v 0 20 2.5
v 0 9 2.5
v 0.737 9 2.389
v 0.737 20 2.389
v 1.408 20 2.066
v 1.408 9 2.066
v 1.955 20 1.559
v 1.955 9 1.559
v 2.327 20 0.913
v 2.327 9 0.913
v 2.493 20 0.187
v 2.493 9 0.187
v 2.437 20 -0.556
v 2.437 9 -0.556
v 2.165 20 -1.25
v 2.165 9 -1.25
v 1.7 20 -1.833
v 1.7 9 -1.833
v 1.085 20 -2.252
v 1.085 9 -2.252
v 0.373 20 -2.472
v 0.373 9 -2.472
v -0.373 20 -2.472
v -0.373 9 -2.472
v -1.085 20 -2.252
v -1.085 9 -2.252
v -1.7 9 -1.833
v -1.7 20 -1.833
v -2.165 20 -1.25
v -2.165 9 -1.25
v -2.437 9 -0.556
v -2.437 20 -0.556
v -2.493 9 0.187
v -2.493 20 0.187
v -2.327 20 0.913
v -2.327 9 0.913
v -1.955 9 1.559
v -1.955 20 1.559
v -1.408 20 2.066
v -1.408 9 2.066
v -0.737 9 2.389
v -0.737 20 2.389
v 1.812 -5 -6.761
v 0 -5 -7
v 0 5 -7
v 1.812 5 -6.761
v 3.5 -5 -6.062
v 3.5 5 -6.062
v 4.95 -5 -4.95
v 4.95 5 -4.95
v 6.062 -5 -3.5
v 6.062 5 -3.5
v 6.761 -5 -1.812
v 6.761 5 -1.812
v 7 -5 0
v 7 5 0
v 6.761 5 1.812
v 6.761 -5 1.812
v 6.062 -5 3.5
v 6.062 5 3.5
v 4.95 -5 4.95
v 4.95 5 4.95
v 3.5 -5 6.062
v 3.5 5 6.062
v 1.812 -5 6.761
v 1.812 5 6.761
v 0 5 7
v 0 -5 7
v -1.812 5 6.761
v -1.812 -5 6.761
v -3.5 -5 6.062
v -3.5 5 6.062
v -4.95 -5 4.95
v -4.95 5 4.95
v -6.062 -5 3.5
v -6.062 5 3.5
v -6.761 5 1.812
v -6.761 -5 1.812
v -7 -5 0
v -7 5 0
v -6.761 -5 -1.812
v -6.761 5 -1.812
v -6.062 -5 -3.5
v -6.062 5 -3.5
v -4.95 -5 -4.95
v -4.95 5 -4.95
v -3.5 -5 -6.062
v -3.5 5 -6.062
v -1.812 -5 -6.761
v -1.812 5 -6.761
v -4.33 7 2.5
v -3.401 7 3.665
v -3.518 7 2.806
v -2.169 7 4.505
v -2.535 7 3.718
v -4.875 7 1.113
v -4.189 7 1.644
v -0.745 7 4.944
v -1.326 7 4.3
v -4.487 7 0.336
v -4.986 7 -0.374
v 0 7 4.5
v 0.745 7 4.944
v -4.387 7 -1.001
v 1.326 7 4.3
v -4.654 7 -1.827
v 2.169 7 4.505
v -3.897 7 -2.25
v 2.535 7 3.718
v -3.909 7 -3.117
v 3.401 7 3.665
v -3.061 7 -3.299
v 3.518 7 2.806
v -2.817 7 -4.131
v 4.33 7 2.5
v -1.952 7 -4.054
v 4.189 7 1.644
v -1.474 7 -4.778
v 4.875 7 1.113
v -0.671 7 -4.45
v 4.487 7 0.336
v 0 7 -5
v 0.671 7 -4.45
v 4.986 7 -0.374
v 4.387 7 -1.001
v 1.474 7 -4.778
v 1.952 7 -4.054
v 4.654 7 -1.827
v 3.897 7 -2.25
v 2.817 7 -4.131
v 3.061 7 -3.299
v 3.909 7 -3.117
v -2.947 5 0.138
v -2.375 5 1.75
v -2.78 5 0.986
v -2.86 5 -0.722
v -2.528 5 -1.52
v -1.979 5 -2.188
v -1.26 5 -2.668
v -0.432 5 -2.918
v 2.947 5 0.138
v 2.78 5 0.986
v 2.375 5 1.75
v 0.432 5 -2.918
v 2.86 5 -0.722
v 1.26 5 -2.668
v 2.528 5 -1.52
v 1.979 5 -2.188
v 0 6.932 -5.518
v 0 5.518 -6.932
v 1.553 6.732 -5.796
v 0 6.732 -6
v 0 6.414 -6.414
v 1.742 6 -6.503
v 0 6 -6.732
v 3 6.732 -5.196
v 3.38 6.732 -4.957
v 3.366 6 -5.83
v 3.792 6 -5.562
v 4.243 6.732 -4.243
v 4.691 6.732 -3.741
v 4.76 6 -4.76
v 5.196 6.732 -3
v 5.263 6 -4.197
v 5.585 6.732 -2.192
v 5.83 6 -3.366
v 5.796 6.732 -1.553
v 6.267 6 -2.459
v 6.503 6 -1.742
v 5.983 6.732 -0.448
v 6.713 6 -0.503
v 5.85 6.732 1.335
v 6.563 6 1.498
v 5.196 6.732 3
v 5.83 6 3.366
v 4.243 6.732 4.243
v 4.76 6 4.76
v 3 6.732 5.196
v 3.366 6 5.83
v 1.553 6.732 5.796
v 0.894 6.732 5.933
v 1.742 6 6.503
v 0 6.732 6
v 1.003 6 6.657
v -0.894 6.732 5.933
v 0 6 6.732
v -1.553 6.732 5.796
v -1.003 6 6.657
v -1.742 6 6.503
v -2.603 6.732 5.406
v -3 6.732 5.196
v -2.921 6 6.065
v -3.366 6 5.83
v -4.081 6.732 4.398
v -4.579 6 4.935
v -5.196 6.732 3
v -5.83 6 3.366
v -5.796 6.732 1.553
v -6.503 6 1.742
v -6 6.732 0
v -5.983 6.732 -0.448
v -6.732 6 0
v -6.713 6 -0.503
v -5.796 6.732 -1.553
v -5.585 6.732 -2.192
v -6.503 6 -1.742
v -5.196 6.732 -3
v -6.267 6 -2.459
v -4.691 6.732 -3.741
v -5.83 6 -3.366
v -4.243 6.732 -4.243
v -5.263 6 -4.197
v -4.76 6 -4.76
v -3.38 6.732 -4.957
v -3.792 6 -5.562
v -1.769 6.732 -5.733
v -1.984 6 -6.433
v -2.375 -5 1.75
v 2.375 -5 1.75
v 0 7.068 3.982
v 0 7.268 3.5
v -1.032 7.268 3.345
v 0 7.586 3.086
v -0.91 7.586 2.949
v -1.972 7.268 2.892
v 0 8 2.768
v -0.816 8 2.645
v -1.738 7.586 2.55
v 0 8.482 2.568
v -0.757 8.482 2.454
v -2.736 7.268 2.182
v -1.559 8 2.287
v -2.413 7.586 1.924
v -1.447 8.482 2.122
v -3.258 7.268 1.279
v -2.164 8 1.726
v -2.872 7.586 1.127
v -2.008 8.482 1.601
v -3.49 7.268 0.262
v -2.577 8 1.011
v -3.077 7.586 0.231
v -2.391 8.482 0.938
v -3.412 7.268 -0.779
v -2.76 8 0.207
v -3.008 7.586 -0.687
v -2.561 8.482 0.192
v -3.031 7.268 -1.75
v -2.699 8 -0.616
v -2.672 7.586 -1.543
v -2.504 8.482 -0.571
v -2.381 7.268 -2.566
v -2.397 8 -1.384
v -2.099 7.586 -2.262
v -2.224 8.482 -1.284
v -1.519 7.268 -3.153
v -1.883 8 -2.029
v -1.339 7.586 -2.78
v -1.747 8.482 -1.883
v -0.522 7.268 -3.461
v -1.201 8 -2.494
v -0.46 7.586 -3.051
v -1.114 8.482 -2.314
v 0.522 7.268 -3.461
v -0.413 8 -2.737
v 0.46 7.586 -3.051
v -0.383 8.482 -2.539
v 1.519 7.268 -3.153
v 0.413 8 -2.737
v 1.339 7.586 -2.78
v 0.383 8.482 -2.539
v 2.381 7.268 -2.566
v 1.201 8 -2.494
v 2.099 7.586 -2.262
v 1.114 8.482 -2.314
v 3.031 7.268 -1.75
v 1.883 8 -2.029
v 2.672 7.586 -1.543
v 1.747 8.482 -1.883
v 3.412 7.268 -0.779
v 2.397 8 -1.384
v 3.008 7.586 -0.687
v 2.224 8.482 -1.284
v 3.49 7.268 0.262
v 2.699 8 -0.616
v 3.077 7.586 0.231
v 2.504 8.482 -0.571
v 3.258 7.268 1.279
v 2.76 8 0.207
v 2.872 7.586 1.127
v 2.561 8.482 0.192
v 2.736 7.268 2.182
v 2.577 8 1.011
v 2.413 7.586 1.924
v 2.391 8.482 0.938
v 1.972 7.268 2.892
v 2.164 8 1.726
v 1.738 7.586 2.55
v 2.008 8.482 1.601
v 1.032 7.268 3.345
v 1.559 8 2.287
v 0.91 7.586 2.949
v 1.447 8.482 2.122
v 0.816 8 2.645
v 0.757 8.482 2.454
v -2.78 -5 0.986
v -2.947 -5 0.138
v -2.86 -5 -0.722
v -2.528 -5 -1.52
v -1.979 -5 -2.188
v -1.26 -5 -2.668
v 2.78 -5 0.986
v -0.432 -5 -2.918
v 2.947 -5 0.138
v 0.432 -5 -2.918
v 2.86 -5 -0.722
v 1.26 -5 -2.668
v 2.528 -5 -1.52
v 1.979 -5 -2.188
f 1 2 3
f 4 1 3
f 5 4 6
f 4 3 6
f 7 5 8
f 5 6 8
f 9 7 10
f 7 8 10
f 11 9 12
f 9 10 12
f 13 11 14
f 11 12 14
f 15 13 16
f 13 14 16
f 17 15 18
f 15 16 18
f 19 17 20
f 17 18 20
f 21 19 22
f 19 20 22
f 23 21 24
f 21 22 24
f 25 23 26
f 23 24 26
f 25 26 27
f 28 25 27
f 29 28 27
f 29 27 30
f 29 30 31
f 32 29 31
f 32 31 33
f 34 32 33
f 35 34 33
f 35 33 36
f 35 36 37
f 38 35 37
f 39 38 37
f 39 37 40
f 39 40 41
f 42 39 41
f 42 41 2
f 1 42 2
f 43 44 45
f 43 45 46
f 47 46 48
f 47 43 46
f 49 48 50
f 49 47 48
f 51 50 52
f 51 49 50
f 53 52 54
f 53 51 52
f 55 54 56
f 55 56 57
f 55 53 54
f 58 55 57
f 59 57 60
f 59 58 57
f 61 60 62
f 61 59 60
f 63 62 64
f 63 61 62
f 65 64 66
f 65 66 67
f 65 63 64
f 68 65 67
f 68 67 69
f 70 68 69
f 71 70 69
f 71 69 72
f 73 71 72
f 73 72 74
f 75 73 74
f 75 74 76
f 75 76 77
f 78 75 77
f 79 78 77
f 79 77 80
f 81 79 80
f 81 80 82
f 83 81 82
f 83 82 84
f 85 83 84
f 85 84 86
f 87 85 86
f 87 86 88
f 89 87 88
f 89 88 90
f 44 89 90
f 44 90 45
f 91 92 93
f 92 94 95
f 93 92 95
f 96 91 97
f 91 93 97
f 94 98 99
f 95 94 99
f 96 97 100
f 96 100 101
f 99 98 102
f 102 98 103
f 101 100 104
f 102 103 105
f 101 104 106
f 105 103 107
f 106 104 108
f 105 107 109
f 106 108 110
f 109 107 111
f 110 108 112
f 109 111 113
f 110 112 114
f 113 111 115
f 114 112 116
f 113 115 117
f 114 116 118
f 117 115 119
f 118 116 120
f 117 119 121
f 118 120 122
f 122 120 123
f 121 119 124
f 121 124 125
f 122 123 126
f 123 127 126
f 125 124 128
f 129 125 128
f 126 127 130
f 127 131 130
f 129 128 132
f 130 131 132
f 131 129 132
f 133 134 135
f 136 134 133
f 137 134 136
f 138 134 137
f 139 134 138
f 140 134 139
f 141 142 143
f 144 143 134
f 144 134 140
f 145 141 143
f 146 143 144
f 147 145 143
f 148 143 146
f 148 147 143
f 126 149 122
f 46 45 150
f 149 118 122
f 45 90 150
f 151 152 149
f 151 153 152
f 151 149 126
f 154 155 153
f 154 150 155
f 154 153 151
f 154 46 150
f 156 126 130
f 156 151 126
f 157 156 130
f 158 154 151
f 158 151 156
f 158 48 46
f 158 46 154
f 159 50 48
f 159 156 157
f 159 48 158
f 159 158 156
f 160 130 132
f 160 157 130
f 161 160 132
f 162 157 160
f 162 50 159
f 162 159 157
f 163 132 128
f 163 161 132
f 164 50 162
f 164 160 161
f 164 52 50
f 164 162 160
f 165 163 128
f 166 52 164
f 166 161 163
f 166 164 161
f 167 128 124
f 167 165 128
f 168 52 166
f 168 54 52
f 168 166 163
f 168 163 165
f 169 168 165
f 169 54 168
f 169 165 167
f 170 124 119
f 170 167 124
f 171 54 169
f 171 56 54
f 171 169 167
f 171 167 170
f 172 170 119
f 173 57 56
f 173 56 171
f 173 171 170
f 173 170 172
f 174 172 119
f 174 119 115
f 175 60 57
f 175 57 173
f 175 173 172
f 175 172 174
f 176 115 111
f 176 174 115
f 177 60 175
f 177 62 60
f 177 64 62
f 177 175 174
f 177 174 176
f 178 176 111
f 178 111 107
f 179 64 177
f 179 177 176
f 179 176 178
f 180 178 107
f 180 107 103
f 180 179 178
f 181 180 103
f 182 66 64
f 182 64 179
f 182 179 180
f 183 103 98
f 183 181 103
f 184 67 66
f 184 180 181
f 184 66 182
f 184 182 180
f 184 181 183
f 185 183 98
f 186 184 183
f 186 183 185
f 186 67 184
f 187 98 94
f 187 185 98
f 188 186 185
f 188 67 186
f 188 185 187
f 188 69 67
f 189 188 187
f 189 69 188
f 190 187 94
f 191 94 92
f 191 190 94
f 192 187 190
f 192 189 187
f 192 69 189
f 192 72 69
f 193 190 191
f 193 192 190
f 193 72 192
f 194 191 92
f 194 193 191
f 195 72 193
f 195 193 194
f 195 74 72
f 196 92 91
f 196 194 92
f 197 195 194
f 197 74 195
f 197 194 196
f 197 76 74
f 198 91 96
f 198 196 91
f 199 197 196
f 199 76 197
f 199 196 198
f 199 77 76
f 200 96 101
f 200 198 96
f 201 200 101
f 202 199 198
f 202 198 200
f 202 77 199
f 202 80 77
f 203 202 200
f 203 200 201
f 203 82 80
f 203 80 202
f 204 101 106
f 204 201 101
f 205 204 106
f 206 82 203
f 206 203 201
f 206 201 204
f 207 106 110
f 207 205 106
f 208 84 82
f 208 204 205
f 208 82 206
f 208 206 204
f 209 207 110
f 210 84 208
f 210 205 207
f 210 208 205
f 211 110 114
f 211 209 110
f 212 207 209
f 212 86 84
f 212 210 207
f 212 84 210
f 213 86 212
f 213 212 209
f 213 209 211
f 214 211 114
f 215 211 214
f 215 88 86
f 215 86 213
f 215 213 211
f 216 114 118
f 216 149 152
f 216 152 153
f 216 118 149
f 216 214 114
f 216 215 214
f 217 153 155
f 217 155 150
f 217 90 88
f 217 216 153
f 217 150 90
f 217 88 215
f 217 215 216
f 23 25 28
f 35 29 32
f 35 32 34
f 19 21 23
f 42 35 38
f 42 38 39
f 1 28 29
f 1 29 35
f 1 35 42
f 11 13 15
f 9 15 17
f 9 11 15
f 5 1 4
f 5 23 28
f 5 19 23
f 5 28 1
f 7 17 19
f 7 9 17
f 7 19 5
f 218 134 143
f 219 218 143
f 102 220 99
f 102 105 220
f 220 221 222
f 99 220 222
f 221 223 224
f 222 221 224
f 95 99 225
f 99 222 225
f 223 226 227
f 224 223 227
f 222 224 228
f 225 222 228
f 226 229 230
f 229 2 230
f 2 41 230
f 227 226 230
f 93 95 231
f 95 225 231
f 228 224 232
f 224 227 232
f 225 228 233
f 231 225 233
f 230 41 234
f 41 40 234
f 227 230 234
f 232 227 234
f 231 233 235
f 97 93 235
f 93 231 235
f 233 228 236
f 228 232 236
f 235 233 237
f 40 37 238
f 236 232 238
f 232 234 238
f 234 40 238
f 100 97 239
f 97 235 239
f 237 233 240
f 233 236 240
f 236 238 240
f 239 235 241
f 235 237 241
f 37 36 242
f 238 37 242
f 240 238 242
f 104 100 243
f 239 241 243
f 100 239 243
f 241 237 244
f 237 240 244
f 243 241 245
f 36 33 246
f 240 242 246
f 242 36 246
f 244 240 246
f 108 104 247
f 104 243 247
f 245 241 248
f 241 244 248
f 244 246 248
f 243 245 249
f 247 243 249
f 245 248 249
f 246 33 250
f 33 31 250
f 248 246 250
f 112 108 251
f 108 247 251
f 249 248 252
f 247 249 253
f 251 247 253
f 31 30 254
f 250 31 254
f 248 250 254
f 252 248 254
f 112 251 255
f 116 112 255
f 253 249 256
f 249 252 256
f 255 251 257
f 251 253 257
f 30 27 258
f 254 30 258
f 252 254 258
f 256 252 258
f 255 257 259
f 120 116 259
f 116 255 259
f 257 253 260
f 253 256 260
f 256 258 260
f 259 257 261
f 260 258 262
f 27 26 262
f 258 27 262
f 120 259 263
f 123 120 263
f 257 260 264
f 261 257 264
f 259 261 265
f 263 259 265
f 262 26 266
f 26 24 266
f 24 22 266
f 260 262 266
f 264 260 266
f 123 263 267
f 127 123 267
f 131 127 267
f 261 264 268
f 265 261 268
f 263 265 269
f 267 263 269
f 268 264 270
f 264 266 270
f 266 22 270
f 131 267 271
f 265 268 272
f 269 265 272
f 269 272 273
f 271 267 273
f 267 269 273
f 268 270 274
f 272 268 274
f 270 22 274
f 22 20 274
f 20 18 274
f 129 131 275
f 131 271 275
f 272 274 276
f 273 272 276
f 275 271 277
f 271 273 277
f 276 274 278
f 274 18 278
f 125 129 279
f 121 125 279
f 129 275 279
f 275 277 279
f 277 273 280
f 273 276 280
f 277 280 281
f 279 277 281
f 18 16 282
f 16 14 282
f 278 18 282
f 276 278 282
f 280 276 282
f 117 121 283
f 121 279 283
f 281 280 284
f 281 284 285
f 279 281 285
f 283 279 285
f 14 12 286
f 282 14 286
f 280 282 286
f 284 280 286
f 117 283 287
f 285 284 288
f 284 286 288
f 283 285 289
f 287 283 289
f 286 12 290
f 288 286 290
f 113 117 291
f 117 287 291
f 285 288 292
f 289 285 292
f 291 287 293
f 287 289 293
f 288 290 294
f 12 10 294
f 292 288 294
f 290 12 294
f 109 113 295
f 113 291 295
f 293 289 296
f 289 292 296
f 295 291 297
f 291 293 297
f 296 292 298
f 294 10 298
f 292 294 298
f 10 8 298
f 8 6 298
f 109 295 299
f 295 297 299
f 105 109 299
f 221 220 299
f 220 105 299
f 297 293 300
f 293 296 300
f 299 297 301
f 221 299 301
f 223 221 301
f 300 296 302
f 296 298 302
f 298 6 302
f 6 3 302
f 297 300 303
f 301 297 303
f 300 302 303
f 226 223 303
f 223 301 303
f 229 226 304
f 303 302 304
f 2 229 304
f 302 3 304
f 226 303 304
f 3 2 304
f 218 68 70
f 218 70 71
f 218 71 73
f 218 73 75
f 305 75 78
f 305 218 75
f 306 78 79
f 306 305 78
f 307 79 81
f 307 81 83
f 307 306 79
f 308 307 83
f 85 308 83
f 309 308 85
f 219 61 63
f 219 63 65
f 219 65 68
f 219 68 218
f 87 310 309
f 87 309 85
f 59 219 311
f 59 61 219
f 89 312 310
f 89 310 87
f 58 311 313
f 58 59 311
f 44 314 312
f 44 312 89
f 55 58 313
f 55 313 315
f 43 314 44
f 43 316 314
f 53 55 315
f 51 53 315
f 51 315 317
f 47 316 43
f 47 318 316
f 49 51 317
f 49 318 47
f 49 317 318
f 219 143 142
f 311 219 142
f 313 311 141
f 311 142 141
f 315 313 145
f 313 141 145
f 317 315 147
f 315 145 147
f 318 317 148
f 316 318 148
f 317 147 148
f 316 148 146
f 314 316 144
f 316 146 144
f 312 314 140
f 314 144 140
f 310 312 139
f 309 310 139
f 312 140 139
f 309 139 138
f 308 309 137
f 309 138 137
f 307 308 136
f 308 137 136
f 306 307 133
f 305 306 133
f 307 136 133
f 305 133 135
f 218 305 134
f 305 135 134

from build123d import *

# Parameters (mm, degrees)
SKETCH1_R           = 12.5
SKETCH1_R_2         = 2
BOSS_EXTRUDE1_DEPTH = 5
SKETCH2_R           = 2.5
BOSS_EXTRUDE2_DEPTH = 15
SKETCH3_R           = 5
CUT_EXTRUDE1_DEPTH  = 2
SKETCH4_R           = 12.5
CUT_EXTRUDE2_DEPTH  = 24.184046239
SKETCH5_R           = 7
BOSS_EXTRUDE3_DEPTH = 10
BOSS_EXTRUDE4_START = -2
SKETCH5_3_R         = 7
BOSS_EXTRUDE4_DEPTH = 2
FILLET1_R           = 2
FILLET2_R           = 2


with BuildPart() as part:
    # Sketch1 → Boss-Extrude1 (new body)
    with BuildSketch(Plane(origin=(0, 0, 0), x_dir=(1, 0, 0), z_dir=(0, 1, 0))):
        Circle(SKETCH1_R)
        with Locations((-7.5, 0)):
            Circle(SKETCH1_R_2, mode=Mode.SUBTRACT)
        with BuildLine():
            ThreePointArc((2, -7.5), (-1.414213562, -8.914213562), (0, -5.5))
            ThreePointArc((0, -5.5), (1.414213562, -6.085786438), (2, -7.5))
        make_face(mode=Mode.SUBTRACT)
        with BuildLine():
            ThreePointArc((9.5, 0), (7.5, -2), (5.5, 0))
            ThreePointArc((5.5, 0), (7.5, 2), (9.5, 0))
        make_face(mode=Mode.SUBTRACT)
        with BuildLine():
            ThreePointArc((2, 7.5), (1.414213562, 6.085786438), (0, 5.5))
            ThreePointArc((0, 5.5), (-1.414213562, 8.914213562), (2, 7.5))
        make_face(mode=Mode.SUBTRACT)
    extrude(amount=BOSS_EXTRUDE1_DEPTH)

    # Sketch2 → Boss-Extrude2 (add)
    with BuildSketch(Plane(origin=(0, 5, 0), x_dir=(1, 0, 0), z_dir=(0, 1, 0))):
        Circle(SKETCH2_R)
    extrude(amount=BOSS_EXTRUDE2_DEPTH)

    # Sketch3 → Cut-Extrude1 (cut)
    with BuildSketch(Plane.XZ):
        Circle(SKETCH3_R)
    extrude(amount=-CUT_EXTRUDE1_DEPTH, mode=Mode.SUBTRACT)

    # Sketch4 → Cut-Extrude2 (cut, through all)
    with BuildSketch(Plane(origin=(0, 5, 0), x_dir=(1, 0, 0), z_dir=(0, 1, 0))):
        Circle(SKETCH4_R)
    extrude(amount=-CUT_EXTRUDE2_DEPTH, mode=Mode.SUBTRACT)

    # Sketch5 → Boss-Extrude3 (add)
    with BuildSketch(Plane.XZ.offset(-5)):
        Circle(SKETCH5_R)
        with BuildLine():
            ThreePointArc((2.374868417, 1.75), (0, -2.95), (-2.374868417, 1.75))
            Line((-2.374868417, 1.75), (2.374868417, 1.75))
        make_face(mode=Mode.SUBTRACT)
    extrude(amount=BOSS_EXTRUDE3_DEPTH)

    # Sketch5<3> → Boss-Extrude4 (add)
    with BuildSketch(Plane.XZ.offset(-5).offset(BOSS_EXTRUDE4_START)):
        Circle(SKETCH5_3_R)
    extrude(amount=BOSS_EXTRUDE4_DEPTH)

    # Fillet1
    fillet1_edges = [part.edges().sort_by_distance(p)[0] for p in [
        (-2.5, 7, 0),
    ]]
    fillet(fillet1_edges, radius=FILLET1_R)

    # Fillet2
    fillet2_edges = [part.edges().sort_by_distance(p)[0] for p in [
        (-7, 7, 0),
    ]]
    fillet(fillet2_edges, radius=FILLET2_R)


solid = part.part
